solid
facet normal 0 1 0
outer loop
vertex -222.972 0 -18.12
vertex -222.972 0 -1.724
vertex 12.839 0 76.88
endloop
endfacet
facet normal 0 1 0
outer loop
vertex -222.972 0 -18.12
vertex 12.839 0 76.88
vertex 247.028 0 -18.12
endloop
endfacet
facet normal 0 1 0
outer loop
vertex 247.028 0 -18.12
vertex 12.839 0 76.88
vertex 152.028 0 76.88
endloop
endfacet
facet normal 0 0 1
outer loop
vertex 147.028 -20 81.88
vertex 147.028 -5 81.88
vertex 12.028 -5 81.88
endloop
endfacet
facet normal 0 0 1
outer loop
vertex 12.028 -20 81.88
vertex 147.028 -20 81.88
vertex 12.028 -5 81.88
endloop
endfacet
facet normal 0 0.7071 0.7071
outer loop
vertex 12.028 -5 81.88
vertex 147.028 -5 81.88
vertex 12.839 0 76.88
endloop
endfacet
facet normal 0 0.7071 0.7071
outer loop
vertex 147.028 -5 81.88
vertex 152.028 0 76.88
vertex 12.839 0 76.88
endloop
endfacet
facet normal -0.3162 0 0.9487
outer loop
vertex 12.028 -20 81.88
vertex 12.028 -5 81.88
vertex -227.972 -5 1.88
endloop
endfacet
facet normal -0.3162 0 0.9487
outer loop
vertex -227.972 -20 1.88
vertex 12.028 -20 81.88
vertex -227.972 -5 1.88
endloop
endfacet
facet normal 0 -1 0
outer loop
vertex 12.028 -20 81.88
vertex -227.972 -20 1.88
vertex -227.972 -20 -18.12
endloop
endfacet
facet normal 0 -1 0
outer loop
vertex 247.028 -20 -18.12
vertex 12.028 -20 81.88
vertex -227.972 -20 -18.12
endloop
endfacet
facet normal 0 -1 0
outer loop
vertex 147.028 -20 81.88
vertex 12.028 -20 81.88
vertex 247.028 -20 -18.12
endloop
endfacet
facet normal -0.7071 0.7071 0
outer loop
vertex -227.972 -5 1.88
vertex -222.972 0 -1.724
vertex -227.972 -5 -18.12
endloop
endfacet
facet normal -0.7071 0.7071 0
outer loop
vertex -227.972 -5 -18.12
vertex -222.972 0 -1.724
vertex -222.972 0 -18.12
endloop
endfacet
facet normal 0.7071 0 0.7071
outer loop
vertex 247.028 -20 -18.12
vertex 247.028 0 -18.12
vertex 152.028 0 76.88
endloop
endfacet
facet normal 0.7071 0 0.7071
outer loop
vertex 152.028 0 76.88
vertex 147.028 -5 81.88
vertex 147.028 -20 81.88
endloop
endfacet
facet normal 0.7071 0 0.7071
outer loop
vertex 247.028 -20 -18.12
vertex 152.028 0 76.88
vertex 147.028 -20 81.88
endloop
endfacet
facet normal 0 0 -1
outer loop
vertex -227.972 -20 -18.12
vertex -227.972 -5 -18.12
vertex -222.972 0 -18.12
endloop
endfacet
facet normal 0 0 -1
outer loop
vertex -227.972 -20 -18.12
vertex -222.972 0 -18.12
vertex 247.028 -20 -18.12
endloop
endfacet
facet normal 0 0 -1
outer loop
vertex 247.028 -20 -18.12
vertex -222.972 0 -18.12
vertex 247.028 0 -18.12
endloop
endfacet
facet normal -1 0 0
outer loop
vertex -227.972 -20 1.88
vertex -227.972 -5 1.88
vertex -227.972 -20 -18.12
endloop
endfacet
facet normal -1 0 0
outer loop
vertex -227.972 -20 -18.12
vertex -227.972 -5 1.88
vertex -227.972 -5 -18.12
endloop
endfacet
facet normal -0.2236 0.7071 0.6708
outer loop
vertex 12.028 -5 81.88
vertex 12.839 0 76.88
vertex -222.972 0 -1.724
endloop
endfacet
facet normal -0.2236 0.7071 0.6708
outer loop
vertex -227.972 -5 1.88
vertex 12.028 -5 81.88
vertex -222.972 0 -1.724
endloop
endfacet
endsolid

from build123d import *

# Parameters (mm, degrees)
F1_DEPTH = 20
F2_SIZE  = 5
F3_SIZE  = 99.99999


# Not quite as in the source:
# - a fillet or chamfer is up to 0.001 mm smaller than in the source, because OpenCascade refuses the exact size


with BuildPart() as f1:
    # F0 (on Front) → F1 (new body)
    with BuildSketch(Plane.XZ):
        Polygon((-227.9723286629, -18.1198753417), (247.0276713371, -18.1198753417), (247.0276713371, 81.8801246583), (12.0276713371, 81.8801246583), (-227.9723286629, 1.8801246583), align=None)
    extrude(amount=F1_DEPTH)

    # F2
    f2_edges = [f1.edges().sort_by_distance(p)[0] for p in [
        (129.527671, 0, 81.880125),
        (-107.972329, 0, 41.880125),
        (-227.972329, 0, -8.119875),
    ]]
    chamfer(f2_edges, length=F2_SIZE)

    # F3 (size 100 in the source; OpenCascade refuses exactly that, so slightly less here)
    f3_edges = [f1.edges().sort_by_distance(p)[0] for p in [
        (247.027671, -12.5, 81.880125),
    ]]
    chamfer(f3_edges, length=F3_SIZE)


solid = f1.part
